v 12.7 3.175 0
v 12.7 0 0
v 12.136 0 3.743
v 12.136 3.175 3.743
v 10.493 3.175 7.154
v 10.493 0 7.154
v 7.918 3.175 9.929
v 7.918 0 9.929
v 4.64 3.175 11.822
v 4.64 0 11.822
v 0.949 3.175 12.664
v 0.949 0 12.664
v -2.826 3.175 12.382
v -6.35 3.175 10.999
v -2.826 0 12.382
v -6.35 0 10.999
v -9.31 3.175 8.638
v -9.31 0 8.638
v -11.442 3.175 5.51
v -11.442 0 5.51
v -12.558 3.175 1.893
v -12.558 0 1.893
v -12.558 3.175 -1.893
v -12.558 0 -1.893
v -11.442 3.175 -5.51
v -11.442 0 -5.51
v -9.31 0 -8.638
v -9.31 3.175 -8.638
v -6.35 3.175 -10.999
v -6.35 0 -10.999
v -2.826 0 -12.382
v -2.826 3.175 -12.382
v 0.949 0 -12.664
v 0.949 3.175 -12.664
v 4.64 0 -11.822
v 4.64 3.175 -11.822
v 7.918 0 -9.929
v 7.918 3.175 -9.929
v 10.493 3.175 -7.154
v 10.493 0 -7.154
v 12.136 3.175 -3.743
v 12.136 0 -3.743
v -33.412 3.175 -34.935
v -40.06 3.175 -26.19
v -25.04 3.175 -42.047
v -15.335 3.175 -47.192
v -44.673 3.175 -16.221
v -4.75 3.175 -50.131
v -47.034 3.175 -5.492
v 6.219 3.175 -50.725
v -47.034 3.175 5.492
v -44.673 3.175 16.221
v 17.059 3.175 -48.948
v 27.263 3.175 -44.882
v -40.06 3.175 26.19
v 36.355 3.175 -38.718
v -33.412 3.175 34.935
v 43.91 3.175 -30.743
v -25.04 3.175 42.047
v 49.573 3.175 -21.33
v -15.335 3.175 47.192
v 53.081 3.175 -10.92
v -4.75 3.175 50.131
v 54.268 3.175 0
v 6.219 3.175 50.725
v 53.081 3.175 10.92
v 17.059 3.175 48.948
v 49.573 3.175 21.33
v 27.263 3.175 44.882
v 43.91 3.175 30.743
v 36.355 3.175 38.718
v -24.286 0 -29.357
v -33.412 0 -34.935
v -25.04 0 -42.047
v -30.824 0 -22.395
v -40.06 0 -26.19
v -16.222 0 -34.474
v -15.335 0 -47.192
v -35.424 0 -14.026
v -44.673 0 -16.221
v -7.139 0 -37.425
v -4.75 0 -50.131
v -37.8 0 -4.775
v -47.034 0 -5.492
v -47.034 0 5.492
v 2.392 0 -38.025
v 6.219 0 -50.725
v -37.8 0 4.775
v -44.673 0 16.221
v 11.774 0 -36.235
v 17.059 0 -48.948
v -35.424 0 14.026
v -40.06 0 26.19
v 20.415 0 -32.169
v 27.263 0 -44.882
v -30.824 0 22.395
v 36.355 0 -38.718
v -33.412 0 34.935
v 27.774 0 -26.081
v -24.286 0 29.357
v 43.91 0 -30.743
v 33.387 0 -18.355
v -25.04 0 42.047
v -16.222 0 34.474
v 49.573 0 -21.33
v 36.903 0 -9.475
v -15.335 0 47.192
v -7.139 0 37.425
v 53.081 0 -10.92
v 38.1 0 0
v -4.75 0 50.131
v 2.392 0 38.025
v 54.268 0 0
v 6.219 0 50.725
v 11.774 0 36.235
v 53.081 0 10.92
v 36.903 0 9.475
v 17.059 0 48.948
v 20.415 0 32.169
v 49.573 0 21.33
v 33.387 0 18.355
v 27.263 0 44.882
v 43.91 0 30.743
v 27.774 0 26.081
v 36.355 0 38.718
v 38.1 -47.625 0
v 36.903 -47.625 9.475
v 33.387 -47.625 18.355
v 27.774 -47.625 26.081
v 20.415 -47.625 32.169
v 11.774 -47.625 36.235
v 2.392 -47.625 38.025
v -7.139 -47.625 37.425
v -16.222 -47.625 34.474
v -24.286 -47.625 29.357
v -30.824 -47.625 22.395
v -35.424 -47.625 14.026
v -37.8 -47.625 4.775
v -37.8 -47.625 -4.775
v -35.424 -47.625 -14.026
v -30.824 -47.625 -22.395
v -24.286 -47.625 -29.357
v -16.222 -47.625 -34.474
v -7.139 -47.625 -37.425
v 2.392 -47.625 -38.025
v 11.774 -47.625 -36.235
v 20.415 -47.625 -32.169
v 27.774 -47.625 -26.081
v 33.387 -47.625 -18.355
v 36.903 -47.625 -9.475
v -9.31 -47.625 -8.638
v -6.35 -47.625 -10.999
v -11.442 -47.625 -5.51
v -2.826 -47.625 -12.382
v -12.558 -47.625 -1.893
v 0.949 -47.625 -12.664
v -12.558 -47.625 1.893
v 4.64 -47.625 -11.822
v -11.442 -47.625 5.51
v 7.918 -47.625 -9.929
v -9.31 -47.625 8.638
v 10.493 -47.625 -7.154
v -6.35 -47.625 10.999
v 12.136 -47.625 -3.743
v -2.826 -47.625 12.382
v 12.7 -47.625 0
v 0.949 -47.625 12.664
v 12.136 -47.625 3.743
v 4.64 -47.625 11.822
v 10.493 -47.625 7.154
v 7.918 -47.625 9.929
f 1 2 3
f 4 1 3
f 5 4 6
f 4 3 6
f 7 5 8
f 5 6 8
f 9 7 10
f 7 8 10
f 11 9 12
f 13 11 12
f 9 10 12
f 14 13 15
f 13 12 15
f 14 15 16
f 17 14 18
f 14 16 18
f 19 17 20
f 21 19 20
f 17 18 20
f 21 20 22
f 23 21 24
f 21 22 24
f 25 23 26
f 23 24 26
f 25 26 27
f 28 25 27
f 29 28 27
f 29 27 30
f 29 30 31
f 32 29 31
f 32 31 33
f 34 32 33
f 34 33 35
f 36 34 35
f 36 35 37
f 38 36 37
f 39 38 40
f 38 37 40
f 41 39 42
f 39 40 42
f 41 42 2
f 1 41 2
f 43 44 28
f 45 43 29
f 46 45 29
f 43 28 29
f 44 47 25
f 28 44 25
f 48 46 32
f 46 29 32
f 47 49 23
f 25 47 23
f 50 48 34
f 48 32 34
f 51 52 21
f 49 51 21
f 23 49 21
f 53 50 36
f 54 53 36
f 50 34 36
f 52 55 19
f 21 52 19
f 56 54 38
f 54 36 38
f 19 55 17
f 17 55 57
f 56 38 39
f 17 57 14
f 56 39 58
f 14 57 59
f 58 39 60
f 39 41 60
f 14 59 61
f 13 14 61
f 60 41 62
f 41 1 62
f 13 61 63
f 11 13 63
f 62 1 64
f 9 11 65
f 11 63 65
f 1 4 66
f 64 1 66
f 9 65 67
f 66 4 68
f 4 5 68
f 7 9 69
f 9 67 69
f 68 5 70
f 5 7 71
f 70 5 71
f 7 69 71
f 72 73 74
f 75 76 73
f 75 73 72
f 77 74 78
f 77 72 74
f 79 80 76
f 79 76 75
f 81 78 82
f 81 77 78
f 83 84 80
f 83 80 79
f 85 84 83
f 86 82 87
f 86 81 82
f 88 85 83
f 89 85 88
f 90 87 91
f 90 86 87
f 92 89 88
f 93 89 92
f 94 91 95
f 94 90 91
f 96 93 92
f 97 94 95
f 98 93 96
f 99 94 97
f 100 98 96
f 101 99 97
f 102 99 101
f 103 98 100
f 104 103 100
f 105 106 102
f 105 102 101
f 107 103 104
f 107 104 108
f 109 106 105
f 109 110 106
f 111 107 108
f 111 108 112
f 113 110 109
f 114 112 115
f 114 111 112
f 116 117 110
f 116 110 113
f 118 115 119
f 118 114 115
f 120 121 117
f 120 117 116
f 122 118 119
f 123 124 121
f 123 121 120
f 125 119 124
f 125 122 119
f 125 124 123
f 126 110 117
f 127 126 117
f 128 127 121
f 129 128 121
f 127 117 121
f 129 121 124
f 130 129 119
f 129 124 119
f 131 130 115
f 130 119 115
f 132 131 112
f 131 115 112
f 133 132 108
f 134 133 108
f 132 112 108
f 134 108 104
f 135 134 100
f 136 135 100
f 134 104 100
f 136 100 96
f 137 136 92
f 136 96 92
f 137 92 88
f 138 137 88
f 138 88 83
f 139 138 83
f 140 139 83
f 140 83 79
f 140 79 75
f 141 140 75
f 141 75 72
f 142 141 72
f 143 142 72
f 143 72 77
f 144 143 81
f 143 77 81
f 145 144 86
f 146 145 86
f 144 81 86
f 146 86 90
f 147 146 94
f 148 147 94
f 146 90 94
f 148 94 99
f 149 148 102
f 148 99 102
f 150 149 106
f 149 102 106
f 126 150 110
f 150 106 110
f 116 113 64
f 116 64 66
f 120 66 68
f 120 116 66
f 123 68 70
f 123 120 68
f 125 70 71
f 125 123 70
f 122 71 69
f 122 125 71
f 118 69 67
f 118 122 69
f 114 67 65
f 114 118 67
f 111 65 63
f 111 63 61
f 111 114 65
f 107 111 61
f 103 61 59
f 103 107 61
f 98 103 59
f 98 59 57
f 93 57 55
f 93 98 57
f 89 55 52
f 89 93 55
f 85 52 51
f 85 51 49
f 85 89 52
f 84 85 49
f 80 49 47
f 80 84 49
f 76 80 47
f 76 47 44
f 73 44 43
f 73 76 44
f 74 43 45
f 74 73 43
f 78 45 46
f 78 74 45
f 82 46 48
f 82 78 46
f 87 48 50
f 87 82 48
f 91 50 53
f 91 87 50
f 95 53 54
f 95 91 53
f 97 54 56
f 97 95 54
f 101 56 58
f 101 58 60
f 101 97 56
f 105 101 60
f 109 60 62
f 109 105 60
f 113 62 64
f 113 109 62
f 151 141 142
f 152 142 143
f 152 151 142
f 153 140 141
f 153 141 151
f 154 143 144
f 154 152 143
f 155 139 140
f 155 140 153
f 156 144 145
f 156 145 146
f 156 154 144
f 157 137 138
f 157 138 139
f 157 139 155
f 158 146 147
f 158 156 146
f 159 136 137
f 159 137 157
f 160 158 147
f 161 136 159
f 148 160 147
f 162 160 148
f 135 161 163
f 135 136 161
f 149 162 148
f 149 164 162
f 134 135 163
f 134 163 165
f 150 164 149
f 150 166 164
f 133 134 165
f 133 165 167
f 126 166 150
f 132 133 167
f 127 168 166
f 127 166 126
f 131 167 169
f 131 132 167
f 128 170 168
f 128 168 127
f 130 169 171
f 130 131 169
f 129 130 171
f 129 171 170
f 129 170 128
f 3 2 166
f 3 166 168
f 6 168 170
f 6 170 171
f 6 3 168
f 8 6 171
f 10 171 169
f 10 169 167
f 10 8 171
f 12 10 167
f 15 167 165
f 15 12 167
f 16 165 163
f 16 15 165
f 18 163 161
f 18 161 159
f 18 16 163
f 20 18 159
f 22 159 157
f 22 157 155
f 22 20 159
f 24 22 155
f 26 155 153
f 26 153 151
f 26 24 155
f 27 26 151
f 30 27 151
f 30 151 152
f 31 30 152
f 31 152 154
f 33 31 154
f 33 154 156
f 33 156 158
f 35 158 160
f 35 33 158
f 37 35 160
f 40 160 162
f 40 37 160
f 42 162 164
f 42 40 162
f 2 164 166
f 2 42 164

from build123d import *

# Parameters (mm, degrees)
F0_R     = 38.1
F1_DEPTH = 47.625
F2_R     = 50.8
F3_DEPTH = 3.175
F4_R     = 12.7
F5_DEPTH = 47.625
F6_DEPTH = 3.175


with BuildPart() as f1:
    # F0 (on Front) → F1 (new body)
    with BuildSketch(Plane.XZ):
        Circle(F0_R)
    extrude(amount=F1_DEPTH)

    # F2 (on Front) → F3 (join)
    with BuildSketch(Plane.XZ):
        with Locations((3.468244, 0)):
            Circle(F2_R)
    extrude(amount=-F3_DEPTH)

    # F4 (on Front) → F5 (cut, through all)
    with BuildSketch(Plane.XZ):
        Circle(F4_R)
    extrude(amount=F5_DEPTH, mode=Mode.SUBTRACT)

    # F4 (on Front) → F6 (cut, through all)
    with BuildSketch(Plane.XZ):
        Circle(F4_R)
    extrude(amount=-F6_DEPTH, mode=Mode.SUBTRACT)


solid = f1.part
